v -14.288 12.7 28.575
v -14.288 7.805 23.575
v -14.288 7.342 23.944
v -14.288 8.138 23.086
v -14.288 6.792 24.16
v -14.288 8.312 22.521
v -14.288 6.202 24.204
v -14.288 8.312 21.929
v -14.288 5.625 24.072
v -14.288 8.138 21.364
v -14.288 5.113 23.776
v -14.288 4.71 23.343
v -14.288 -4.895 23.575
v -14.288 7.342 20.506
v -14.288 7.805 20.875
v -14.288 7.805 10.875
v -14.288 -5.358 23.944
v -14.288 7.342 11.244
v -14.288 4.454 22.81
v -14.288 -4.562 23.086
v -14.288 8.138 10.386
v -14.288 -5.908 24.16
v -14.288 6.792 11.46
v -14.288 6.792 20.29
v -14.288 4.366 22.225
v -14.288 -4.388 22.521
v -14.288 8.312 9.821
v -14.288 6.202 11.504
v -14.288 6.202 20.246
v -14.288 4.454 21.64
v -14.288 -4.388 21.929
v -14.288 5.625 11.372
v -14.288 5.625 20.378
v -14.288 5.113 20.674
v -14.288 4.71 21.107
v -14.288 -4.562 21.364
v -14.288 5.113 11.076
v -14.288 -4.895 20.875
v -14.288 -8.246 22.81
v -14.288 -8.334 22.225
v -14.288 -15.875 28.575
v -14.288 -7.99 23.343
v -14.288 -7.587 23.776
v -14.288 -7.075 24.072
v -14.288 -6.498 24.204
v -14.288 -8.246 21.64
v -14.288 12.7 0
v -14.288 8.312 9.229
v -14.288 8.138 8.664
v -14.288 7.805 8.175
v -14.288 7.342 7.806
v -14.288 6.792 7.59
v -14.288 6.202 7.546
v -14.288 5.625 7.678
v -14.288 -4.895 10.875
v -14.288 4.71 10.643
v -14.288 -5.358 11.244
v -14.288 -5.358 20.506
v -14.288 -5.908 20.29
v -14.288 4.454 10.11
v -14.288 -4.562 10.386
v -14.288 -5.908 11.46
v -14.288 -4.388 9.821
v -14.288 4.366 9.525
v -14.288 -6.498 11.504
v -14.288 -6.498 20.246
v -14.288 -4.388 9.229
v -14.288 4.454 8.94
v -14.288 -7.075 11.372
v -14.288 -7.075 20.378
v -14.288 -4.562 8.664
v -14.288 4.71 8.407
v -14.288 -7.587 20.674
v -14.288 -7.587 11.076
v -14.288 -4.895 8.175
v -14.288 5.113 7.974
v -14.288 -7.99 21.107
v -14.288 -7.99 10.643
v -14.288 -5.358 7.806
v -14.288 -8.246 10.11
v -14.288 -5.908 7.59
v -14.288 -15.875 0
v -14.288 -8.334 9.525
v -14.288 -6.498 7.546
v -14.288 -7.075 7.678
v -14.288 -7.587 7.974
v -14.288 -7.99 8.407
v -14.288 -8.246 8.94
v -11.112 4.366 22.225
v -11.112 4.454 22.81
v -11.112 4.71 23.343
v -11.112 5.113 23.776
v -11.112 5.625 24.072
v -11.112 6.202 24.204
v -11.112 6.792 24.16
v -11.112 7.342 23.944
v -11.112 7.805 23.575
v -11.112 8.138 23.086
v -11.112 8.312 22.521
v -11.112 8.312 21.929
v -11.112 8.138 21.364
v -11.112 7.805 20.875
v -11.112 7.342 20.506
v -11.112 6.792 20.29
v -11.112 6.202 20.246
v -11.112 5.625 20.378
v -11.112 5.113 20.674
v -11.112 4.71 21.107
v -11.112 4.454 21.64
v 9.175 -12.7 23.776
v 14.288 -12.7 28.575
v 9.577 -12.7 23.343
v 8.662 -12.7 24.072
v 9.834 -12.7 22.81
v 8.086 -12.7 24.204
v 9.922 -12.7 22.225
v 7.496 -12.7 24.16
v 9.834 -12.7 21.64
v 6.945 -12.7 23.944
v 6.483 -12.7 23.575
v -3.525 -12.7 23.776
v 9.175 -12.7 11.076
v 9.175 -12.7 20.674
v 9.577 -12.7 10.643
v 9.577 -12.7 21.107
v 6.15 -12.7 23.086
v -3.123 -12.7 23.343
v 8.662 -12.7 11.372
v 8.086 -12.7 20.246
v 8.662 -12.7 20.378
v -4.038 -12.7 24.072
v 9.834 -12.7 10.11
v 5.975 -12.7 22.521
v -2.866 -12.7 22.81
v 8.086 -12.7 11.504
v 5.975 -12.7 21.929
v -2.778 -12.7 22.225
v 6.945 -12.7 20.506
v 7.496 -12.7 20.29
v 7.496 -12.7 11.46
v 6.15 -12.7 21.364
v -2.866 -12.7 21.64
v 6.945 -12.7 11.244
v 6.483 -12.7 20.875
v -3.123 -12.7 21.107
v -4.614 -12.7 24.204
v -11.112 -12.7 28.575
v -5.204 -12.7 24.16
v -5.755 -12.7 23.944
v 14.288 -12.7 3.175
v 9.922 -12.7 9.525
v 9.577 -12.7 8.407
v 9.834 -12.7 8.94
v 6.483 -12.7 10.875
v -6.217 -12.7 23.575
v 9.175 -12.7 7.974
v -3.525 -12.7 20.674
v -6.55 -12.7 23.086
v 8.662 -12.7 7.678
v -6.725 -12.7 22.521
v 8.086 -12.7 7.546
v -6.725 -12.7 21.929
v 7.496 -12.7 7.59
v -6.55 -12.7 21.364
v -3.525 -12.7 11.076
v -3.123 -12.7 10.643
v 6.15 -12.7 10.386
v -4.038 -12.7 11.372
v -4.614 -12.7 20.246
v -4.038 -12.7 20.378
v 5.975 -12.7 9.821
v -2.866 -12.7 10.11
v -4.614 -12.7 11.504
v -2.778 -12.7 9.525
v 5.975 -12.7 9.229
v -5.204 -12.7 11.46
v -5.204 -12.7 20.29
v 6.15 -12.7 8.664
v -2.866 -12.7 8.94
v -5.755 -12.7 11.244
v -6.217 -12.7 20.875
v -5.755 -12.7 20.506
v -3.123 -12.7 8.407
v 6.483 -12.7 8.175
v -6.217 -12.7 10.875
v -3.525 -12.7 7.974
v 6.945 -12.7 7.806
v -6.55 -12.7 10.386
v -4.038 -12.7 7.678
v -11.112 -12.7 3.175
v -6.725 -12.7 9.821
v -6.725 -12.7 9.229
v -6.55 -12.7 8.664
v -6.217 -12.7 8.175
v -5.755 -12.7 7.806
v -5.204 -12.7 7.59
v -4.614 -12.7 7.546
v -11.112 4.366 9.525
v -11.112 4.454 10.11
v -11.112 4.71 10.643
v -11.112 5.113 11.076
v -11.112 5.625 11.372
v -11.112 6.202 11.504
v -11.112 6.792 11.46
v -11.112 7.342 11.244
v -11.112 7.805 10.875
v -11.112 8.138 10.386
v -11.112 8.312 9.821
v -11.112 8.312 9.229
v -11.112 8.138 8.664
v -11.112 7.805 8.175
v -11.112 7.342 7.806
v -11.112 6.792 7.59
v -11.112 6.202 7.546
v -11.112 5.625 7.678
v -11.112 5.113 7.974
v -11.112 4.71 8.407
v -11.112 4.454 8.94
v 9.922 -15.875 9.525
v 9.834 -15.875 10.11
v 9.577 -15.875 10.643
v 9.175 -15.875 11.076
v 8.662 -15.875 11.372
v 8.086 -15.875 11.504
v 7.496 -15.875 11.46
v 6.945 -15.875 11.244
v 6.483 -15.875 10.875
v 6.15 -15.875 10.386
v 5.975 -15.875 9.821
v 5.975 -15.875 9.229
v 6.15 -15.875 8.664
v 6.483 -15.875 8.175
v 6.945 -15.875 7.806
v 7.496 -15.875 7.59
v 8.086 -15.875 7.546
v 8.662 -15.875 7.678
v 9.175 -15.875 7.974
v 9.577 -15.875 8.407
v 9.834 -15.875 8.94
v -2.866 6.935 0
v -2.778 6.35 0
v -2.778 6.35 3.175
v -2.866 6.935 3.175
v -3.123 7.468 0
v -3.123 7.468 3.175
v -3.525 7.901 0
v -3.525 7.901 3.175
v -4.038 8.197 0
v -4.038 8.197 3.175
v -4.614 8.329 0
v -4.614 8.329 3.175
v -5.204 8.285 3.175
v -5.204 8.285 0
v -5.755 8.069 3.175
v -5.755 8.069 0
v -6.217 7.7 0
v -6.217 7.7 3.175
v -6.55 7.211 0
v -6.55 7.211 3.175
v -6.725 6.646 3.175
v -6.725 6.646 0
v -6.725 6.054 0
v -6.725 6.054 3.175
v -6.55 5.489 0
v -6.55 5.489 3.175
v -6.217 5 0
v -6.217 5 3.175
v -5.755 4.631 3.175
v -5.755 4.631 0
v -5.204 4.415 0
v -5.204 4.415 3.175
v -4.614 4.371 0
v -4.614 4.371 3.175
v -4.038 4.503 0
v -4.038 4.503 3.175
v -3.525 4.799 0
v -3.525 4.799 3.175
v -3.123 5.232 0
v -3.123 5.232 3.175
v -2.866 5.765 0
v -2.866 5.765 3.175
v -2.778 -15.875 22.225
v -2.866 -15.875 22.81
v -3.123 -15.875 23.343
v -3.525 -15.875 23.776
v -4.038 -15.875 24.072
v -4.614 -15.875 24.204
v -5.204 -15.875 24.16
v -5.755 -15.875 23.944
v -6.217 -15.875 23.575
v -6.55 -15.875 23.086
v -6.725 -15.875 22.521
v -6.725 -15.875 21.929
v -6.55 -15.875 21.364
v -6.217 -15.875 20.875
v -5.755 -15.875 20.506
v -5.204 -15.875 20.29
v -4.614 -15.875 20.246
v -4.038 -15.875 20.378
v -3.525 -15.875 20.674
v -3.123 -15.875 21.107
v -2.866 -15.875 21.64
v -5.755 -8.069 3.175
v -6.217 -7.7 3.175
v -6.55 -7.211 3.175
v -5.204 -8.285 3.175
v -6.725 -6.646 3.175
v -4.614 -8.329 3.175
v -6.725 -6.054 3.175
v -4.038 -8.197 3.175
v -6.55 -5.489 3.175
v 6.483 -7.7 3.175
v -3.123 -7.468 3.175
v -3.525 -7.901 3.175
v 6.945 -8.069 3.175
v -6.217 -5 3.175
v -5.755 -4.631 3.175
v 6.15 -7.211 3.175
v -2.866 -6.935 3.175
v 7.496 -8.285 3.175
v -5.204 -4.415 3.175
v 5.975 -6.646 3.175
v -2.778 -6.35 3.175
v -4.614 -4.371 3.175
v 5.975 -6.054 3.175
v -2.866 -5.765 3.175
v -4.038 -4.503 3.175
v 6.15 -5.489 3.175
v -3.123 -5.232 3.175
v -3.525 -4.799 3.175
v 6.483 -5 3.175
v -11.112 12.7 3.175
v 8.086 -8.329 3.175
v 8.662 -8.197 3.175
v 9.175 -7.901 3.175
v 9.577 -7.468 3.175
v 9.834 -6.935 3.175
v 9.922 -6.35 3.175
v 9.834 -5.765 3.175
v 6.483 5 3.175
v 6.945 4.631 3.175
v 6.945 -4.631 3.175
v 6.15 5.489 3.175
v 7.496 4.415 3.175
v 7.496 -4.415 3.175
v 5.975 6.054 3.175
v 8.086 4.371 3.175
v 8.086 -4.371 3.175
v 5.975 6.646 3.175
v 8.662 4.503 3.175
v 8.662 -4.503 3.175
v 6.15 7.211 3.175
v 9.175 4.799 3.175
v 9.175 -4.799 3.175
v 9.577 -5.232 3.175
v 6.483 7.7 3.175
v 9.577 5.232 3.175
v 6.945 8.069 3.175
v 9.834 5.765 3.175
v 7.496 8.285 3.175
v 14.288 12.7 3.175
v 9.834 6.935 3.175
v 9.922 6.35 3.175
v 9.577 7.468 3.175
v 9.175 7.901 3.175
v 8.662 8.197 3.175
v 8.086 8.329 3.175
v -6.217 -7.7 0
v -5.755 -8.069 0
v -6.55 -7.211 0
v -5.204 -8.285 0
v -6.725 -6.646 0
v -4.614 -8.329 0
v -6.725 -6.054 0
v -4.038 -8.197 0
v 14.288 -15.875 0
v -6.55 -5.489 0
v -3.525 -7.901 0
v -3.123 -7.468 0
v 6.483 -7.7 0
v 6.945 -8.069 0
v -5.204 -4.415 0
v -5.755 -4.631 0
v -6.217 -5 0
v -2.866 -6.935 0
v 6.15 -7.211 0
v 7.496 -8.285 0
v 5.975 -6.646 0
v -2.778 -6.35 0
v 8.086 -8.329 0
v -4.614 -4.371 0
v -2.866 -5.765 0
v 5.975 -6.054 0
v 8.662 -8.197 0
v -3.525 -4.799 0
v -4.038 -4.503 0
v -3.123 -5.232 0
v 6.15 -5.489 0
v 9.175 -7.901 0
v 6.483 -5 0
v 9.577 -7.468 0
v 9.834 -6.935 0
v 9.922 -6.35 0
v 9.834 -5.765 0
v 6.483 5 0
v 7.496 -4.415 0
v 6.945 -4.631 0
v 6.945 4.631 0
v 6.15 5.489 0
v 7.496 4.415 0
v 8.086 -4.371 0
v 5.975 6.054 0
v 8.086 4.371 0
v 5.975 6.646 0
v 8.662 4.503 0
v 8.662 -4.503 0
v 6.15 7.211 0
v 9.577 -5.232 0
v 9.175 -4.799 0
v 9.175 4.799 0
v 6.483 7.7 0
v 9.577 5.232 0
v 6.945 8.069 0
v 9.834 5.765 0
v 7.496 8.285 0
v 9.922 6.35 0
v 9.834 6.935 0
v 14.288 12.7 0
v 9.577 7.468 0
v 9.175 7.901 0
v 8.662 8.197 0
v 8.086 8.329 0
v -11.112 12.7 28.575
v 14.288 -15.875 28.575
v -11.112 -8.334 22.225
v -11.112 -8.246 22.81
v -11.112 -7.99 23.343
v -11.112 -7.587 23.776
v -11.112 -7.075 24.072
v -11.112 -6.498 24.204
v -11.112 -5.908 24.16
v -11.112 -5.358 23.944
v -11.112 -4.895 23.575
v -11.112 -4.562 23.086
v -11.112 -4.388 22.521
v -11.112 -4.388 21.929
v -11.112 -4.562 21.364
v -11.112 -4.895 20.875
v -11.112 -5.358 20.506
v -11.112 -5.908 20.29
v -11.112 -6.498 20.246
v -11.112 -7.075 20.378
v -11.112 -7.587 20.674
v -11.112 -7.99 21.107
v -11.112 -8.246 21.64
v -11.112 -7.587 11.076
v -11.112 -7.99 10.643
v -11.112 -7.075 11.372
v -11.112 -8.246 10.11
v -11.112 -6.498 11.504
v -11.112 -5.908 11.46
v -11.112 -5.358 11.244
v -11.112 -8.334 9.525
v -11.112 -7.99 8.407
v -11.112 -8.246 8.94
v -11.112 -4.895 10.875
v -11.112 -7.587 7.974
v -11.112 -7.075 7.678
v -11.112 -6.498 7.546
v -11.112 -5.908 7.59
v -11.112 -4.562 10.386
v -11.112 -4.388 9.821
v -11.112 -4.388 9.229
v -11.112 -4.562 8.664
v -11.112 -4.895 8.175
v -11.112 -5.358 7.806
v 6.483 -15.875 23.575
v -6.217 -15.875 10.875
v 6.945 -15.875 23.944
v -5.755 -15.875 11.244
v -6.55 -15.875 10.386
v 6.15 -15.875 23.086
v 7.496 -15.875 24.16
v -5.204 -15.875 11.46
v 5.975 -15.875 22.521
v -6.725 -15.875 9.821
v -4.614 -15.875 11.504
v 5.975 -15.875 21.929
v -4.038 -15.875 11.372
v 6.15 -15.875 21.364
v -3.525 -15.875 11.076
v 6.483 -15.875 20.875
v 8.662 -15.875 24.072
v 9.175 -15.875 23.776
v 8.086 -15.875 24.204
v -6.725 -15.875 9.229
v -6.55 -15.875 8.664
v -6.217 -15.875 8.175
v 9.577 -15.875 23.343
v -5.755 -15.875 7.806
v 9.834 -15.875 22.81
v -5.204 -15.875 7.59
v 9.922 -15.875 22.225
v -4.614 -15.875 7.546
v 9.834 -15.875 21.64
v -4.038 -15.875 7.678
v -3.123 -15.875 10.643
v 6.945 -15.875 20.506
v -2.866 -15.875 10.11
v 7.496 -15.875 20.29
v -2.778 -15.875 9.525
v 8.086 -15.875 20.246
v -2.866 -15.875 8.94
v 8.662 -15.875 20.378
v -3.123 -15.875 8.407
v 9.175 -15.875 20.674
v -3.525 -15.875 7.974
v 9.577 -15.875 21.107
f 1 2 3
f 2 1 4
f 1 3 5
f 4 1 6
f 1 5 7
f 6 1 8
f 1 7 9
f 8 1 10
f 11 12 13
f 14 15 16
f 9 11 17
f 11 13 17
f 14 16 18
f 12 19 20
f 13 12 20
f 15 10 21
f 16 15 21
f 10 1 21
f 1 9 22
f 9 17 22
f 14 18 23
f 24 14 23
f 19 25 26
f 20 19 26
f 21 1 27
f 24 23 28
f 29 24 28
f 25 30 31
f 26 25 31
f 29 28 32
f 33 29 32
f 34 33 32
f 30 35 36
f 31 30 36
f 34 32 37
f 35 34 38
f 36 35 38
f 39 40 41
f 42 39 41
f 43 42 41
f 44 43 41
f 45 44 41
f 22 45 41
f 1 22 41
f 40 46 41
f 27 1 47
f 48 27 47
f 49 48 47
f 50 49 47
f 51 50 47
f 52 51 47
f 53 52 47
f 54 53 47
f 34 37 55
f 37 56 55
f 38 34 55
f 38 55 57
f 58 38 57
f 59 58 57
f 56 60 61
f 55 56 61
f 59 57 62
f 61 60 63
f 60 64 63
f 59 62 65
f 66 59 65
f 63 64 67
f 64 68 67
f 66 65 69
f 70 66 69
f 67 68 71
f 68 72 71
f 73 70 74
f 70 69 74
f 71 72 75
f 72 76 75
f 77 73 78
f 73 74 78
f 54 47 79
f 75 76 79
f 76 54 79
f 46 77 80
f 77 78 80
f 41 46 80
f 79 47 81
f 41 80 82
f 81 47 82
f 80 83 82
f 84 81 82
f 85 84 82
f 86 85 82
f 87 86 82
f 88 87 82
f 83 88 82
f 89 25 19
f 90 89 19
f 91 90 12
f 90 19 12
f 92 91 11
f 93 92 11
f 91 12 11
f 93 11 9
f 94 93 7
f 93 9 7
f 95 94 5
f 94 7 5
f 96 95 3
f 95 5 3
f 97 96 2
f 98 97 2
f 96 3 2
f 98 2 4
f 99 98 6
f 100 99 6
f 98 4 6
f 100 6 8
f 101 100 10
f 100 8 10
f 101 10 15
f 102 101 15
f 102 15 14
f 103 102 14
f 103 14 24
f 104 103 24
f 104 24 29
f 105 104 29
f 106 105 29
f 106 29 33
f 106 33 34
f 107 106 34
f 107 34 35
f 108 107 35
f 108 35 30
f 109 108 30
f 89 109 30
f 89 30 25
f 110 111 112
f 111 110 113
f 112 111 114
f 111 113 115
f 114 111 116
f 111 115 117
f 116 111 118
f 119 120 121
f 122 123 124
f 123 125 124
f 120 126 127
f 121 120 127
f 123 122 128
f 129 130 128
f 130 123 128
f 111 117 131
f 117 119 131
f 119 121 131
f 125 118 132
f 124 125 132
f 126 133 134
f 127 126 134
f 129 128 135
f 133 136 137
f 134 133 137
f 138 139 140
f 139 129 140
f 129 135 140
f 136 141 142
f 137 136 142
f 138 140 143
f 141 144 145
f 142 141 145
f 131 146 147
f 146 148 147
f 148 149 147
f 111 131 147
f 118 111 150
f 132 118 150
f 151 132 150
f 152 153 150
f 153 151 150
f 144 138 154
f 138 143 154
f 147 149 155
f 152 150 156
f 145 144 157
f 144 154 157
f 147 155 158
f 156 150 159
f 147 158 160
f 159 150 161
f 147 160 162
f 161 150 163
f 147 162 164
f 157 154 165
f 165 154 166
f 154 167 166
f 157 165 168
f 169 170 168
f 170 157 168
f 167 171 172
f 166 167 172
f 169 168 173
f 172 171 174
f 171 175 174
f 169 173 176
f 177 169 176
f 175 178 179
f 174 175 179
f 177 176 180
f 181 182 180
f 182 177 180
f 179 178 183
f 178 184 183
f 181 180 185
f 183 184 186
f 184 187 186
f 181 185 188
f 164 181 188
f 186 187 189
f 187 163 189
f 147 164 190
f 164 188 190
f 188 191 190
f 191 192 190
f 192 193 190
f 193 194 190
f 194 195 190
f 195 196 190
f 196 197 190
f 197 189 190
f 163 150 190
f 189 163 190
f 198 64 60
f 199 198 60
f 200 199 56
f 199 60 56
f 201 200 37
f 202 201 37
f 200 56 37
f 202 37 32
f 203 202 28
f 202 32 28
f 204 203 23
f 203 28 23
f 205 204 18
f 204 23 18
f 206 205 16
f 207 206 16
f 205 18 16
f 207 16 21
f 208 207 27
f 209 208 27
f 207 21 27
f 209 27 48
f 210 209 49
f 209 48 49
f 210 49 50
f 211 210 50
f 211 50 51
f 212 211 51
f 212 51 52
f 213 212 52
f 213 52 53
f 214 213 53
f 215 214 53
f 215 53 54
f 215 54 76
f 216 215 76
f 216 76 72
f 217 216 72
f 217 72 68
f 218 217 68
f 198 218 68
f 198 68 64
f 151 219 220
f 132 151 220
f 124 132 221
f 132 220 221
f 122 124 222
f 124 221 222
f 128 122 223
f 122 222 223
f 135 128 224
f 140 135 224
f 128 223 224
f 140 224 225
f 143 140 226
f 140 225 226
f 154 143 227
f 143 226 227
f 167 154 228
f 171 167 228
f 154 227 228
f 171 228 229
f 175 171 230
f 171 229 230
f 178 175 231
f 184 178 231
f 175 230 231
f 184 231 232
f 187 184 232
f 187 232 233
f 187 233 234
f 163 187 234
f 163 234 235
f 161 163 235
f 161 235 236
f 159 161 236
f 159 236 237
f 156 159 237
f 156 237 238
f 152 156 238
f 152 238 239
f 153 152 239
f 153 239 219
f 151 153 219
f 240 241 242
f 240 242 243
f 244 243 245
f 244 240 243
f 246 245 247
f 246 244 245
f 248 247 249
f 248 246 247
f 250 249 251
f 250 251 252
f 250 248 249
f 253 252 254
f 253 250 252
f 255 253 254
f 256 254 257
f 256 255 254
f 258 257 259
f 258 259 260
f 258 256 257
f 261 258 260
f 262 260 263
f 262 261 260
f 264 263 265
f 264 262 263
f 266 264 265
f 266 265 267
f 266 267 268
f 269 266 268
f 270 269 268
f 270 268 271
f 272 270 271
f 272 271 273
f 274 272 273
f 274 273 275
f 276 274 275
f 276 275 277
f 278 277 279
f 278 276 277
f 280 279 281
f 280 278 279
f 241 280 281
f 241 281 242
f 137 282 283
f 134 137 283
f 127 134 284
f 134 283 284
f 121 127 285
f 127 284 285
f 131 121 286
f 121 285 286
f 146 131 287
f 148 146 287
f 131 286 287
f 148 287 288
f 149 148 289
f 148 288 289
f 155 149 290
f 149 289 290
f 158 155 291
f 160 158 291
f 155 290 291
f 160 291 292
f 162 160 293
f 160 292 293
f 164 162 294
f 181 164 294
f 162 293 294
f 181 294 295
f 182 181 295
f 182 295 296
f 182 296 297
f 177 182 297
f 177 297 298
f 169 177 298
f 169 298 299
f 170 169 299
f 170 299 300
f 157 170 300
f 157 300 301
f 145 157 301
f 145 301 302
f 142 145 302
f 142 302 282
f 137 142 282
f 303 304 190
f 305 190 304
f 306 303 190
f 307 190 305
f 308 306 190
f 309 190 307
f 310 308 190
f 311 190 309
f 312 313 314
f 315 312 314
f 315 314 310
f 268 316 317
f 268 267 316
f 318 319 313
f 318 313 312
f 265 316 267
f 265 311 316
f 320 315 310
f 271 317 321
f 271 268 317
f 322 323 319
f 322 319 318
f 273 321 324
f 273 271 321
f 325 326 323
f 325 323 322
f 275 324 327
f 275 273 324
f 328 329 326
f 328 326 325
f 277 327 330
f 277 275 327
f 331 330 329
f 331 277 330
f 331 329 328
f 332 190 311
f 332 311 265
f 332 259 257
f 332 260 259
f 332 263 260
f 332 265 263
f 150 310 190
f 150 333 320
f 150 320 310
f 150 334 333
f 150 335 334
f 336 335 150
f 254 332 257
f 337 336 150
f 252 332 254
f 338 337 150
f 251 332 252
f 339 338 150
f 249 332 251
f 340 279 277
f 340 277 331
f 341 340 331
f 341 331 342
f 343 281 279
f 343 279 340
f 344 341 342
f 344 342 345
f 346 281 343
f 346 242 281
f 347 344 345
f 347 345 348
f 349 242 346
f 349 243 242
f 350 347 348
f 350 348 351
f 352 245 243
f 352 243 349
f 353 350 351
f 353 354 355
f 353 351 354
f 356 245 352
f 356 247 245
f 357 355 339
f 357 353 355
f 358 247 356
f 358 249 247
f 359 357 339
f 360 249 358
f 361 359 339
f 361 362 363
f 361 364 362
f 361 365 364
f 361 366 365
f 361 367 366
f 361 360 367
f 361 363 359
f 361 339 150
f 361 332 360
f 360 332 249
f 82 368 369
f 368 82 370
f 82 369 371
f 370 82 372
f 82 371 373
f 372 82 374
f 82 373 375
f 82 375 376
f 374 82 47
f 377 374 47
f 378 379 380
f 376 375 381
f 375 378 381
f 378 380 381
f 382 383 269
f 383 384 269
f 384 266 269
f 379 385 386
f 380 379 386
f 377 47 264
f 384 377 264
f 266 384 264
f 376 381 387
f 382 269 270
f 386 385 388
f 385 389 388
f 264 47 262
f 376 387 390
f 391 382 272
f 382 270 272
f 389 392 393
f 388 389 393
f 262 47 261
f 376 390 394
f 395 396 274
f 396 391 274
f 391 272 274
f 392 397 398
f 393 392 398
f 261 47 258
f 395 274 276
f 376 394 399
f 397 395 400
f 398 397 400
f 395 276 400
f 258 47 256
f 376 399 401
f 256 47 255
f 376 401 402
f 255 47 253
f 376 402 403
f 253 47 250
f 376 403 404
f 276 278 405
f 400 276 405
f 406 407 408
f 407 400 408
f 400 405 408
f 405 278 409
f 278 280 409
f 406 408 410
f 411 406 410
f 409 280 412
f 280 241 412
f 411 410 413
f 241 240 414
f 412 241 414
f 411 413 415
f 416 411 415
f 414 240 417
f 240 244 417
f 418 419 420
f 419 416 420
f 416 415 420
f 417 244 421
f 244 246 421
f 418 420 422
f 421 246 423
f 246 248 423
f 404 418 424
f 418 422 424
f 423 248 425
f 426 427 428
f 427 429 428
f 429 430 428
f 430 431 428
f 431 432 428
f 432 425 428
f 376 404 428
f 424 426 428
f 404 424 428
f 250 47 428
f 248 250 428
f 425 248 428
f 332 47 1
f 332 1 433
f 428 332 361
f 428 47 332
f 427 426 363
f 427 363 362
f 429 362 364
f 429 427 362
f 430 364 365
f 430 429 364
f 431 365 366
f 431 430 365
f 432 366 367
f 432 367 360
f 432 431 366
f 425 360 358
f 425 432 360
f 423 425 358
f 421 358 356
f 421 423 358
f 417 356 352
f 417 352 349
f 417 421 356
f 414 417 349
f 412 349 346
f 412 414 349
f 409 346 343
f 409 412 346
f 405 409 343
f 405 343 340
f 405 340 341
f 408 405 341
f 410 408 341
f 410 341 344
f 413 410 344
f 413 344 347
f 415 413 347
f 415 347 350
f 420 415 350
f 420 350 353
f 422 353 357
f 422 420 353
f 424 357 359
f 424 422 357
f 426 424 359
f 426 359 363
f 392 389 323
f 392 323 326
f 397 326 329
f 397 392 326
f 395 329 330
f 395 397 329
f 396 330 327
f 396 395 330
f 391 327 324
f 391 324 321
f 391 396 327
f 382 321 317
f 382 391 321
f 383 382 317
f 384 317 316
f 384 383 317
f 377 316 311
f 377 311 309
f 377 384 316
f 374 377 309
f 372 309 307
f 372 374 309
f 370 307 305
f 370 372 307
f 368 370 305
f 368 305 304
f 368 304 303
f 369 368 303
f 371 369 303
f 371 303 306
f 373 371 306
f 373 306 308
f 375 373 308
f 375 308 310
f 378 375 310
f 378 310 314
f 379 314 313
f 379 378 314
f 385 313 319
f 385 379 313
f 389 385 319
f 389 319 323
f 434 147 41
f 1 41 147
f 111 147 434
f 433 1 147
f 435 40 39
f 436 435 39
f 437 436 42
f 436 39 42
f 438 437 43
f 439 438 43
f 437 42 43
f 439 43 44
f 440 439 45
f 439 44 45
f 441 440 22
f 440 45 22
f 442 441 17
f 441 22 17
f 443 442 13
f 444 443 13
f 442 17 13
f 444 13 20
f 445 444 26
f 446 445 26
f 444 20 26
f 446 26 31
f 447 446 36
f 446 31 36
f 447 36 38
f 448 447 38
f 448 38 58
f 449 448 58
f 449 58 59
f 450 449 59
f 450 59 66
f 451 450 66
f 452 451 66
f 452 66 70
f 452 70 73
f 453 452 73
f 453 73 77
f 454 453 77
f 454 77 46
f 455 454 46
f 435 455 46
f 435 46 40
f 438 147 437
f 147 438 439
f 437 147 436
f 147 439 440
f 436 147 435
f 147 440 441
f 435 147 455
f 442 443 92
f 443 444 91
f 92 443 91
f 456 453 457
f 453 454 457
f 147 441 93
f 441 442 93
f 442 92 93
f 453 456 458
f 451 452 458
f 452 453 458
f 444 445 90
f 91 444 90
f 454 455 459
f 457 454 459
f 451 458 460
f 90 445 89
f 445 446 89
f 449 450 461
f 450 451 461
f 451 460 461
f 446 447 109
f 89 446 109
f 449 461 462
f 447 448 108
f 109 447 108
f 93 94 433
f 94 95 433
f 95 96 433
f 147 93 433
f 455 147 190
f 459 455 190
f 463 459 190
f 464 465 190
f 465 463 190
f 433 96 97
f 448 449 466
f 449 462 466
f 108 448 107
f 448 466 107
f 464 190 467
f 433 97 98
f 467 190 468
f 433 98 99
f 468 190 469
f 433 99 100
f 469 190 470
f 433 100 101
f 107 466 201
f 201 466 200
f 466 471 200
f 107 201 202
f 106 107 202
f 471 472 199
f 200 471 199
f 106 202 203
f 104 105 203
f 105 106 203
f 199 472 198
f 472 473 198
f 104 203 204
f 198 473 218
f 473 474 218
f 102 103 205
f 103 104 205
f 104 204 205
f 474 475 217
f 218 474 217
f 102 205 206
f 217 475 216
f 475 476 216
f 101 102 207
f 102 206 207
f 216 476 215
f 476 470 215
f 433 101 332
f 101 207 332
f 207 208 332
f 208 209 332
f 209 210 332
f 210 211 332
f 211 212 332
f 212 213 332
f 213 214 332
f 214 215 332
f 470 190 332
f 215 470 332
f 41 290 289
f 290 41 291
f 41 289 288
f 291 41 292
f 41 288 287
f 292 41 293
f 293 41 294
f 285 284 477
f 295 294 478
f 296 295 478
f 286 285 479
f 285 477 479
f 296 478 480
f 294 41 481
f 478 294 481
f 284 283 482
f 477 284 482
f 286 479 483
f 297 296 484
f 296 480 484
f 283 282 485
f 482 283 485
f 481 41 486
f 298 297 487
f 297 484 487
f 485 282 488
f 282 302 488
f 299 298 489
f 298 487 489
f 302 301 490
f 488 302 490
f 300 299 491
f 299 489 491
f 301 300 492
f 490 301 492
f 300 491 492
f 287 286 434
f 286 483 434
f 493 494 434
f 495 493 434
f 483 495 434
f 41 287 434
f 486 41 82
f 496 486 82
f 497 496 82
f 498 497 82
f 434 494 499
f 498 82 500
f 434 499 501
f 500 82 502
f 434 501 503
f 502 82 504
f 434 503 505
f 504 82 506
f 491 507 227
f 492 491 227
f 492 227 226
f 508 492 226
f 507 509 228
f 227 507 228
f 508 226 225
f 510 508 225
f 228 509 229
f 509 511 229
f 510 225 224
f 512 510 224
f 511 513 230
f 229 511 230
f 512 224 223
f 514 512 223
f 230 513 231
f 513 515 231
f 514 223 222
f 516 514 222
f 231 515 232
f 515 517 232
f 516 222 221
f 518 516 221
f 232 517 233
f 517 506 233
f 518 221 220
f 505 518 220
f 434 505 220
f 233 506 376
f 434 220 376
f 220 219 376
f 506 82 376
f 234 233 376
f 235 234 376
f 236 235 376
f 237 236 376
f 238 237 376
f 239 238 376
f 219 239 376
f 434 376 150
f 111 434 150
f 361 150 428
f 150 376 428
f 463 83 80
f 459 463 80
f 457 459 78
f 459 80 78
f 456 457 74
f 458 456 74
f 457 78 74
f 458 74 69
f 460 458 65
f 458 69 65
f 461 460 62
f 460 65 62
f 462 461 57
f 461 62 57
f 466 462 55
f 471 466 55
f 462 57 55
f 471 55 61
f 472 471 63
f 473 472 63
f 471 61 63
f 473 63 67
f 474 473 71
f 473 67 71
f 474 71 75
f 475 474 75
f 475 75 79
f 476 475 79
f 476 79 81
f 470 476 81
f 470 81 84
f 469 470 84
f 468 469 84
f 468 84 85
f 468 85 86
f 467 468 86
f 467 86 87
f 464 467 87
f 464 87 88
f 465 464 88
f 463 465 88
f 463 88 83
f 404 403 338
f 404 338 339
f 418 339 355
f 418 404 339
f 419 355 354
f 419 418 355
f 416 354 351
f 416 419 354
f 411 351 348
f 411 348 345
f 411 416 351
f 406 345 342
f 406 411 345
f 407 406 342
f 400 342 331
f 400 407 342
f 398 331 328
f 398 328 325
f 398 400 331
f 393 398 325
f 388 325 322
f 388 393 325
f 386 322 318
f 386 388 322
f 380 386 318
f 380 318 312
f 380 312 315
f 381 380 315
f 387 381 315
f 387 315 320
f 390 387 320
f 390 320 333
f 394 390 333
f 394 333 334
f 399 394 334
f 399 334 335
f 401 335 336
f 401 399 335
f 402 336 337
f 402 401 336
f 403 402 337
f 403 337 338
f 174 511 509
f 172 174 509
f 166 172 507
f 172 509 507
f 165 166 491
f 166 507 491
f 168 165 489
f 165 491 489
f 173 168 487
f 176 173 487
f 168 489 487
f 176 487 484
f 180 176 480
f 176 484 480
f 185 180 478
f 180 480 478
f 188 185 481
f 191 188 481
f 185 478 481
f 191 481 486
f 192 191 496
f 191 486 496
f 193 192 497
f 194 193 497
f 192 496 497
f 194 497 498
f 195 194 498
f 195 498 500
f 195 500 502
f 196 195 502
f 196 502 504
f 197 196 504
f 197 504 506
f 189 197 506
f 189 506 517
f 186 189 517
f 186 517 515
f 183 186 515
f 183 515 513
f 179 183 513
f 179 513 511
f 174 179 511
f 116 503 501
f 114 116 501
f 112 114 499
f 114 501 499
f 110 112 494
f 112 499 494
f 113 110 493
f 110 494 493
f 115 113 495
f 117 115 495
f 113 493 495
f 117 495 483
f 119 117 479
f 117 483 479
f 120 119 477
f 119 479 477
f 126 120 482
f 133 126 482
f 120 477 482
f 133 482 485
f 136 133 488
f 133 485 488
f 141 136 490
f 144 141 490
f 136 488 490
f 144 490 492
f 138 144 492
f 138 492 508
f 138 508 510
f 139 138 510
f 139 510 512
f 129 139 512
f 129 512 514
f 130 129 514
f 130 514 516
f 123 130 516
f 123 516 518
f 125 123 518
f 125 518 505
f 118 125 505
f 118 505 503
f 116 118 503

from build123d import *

# Parameters (mm, degrees)
F1_DEPTH = 28.575
F0_W     = 25.4
F0_H     = 25.4
F0_R     = 1.984375
F2_DEPTH = 3.175
F3_R     = 1.984375
F5_DEPTH = 25.4
F4_R     = 1.984375
F6_DEPTH = 25.4


with BuildPart() as f1:
    # F0 (on Top) → F1 (new body)
    with BuildSketch(Plane.XY):
        Polygon((-11.1125, 12.7), (-14.2875, 12.7), (-14.2875, -12.7), (-14.2875, -15.875), (14.2875, -15.875), (14.2875, -12.7), (-11.1125, -12.7), align=None)
    extrude(amount=F1_DEPTH)

    # F0 (on Top) → F2 (join)
    with BuildSketch(Plane.XY):
        with Locations((1.5875, 0)):
            Rectangle(F0_W, F0_H)
        with Locations((-4.7625, -6.35)):
            Circle(F0_R, mode=Mode.SUBTRACT)
        with Locations((7.9375, -6.35)):
            Circle(F0_R, mode=Mode.SUBTRACT)
        with Locations((-4.7625, 6.35)):
            Circle(F0_R, mode=Mode.SUBTRACT)
        with Locations((7.9375, 6.35)):
            Circle(F0_R, mode=Mode.SUBTRACT)
    extrude(amount=F2_DEPTH)

    # F3 (on face) → F5 (cut)
    with BuildSketch(Plane(origin=(-14.2875, 0, 0), x_dir=(0, -1, 0), z_dir=(-1, 0, 0))):
        with Locations((-6.35, 22.225)):
            Circle(F3_R)
        with Locations((6.35, 22.225)):
            Circle(F3_R)
        with Locations((6.35, 9.525)):
            Circle(F3_R)
        with Locations((-6.35, 9.525)):
            Circle(F3_R)
    extrude(amount=-F5_DEPTH, mode=Mode.SUBTRACT)

    # F4 (on face) → F6 (cut)
    with BuildSketch(Plane.XZ.offset(15.875)):
        with Locations((7.9375, 22.225)):
            Circle(F4_R)
        with Locations((7.9375, 9.525)):
            Circle(F4_R)
        with Locations((-4.7625, 9.525)):
            Circle(F4_R)
        with Locations((-4.7625, 22.225)):
            Circle(F4_R)
    extrude(amount=-F6_DEPTH, mode=Mode.SUBTRACT)


solid = f1.part
